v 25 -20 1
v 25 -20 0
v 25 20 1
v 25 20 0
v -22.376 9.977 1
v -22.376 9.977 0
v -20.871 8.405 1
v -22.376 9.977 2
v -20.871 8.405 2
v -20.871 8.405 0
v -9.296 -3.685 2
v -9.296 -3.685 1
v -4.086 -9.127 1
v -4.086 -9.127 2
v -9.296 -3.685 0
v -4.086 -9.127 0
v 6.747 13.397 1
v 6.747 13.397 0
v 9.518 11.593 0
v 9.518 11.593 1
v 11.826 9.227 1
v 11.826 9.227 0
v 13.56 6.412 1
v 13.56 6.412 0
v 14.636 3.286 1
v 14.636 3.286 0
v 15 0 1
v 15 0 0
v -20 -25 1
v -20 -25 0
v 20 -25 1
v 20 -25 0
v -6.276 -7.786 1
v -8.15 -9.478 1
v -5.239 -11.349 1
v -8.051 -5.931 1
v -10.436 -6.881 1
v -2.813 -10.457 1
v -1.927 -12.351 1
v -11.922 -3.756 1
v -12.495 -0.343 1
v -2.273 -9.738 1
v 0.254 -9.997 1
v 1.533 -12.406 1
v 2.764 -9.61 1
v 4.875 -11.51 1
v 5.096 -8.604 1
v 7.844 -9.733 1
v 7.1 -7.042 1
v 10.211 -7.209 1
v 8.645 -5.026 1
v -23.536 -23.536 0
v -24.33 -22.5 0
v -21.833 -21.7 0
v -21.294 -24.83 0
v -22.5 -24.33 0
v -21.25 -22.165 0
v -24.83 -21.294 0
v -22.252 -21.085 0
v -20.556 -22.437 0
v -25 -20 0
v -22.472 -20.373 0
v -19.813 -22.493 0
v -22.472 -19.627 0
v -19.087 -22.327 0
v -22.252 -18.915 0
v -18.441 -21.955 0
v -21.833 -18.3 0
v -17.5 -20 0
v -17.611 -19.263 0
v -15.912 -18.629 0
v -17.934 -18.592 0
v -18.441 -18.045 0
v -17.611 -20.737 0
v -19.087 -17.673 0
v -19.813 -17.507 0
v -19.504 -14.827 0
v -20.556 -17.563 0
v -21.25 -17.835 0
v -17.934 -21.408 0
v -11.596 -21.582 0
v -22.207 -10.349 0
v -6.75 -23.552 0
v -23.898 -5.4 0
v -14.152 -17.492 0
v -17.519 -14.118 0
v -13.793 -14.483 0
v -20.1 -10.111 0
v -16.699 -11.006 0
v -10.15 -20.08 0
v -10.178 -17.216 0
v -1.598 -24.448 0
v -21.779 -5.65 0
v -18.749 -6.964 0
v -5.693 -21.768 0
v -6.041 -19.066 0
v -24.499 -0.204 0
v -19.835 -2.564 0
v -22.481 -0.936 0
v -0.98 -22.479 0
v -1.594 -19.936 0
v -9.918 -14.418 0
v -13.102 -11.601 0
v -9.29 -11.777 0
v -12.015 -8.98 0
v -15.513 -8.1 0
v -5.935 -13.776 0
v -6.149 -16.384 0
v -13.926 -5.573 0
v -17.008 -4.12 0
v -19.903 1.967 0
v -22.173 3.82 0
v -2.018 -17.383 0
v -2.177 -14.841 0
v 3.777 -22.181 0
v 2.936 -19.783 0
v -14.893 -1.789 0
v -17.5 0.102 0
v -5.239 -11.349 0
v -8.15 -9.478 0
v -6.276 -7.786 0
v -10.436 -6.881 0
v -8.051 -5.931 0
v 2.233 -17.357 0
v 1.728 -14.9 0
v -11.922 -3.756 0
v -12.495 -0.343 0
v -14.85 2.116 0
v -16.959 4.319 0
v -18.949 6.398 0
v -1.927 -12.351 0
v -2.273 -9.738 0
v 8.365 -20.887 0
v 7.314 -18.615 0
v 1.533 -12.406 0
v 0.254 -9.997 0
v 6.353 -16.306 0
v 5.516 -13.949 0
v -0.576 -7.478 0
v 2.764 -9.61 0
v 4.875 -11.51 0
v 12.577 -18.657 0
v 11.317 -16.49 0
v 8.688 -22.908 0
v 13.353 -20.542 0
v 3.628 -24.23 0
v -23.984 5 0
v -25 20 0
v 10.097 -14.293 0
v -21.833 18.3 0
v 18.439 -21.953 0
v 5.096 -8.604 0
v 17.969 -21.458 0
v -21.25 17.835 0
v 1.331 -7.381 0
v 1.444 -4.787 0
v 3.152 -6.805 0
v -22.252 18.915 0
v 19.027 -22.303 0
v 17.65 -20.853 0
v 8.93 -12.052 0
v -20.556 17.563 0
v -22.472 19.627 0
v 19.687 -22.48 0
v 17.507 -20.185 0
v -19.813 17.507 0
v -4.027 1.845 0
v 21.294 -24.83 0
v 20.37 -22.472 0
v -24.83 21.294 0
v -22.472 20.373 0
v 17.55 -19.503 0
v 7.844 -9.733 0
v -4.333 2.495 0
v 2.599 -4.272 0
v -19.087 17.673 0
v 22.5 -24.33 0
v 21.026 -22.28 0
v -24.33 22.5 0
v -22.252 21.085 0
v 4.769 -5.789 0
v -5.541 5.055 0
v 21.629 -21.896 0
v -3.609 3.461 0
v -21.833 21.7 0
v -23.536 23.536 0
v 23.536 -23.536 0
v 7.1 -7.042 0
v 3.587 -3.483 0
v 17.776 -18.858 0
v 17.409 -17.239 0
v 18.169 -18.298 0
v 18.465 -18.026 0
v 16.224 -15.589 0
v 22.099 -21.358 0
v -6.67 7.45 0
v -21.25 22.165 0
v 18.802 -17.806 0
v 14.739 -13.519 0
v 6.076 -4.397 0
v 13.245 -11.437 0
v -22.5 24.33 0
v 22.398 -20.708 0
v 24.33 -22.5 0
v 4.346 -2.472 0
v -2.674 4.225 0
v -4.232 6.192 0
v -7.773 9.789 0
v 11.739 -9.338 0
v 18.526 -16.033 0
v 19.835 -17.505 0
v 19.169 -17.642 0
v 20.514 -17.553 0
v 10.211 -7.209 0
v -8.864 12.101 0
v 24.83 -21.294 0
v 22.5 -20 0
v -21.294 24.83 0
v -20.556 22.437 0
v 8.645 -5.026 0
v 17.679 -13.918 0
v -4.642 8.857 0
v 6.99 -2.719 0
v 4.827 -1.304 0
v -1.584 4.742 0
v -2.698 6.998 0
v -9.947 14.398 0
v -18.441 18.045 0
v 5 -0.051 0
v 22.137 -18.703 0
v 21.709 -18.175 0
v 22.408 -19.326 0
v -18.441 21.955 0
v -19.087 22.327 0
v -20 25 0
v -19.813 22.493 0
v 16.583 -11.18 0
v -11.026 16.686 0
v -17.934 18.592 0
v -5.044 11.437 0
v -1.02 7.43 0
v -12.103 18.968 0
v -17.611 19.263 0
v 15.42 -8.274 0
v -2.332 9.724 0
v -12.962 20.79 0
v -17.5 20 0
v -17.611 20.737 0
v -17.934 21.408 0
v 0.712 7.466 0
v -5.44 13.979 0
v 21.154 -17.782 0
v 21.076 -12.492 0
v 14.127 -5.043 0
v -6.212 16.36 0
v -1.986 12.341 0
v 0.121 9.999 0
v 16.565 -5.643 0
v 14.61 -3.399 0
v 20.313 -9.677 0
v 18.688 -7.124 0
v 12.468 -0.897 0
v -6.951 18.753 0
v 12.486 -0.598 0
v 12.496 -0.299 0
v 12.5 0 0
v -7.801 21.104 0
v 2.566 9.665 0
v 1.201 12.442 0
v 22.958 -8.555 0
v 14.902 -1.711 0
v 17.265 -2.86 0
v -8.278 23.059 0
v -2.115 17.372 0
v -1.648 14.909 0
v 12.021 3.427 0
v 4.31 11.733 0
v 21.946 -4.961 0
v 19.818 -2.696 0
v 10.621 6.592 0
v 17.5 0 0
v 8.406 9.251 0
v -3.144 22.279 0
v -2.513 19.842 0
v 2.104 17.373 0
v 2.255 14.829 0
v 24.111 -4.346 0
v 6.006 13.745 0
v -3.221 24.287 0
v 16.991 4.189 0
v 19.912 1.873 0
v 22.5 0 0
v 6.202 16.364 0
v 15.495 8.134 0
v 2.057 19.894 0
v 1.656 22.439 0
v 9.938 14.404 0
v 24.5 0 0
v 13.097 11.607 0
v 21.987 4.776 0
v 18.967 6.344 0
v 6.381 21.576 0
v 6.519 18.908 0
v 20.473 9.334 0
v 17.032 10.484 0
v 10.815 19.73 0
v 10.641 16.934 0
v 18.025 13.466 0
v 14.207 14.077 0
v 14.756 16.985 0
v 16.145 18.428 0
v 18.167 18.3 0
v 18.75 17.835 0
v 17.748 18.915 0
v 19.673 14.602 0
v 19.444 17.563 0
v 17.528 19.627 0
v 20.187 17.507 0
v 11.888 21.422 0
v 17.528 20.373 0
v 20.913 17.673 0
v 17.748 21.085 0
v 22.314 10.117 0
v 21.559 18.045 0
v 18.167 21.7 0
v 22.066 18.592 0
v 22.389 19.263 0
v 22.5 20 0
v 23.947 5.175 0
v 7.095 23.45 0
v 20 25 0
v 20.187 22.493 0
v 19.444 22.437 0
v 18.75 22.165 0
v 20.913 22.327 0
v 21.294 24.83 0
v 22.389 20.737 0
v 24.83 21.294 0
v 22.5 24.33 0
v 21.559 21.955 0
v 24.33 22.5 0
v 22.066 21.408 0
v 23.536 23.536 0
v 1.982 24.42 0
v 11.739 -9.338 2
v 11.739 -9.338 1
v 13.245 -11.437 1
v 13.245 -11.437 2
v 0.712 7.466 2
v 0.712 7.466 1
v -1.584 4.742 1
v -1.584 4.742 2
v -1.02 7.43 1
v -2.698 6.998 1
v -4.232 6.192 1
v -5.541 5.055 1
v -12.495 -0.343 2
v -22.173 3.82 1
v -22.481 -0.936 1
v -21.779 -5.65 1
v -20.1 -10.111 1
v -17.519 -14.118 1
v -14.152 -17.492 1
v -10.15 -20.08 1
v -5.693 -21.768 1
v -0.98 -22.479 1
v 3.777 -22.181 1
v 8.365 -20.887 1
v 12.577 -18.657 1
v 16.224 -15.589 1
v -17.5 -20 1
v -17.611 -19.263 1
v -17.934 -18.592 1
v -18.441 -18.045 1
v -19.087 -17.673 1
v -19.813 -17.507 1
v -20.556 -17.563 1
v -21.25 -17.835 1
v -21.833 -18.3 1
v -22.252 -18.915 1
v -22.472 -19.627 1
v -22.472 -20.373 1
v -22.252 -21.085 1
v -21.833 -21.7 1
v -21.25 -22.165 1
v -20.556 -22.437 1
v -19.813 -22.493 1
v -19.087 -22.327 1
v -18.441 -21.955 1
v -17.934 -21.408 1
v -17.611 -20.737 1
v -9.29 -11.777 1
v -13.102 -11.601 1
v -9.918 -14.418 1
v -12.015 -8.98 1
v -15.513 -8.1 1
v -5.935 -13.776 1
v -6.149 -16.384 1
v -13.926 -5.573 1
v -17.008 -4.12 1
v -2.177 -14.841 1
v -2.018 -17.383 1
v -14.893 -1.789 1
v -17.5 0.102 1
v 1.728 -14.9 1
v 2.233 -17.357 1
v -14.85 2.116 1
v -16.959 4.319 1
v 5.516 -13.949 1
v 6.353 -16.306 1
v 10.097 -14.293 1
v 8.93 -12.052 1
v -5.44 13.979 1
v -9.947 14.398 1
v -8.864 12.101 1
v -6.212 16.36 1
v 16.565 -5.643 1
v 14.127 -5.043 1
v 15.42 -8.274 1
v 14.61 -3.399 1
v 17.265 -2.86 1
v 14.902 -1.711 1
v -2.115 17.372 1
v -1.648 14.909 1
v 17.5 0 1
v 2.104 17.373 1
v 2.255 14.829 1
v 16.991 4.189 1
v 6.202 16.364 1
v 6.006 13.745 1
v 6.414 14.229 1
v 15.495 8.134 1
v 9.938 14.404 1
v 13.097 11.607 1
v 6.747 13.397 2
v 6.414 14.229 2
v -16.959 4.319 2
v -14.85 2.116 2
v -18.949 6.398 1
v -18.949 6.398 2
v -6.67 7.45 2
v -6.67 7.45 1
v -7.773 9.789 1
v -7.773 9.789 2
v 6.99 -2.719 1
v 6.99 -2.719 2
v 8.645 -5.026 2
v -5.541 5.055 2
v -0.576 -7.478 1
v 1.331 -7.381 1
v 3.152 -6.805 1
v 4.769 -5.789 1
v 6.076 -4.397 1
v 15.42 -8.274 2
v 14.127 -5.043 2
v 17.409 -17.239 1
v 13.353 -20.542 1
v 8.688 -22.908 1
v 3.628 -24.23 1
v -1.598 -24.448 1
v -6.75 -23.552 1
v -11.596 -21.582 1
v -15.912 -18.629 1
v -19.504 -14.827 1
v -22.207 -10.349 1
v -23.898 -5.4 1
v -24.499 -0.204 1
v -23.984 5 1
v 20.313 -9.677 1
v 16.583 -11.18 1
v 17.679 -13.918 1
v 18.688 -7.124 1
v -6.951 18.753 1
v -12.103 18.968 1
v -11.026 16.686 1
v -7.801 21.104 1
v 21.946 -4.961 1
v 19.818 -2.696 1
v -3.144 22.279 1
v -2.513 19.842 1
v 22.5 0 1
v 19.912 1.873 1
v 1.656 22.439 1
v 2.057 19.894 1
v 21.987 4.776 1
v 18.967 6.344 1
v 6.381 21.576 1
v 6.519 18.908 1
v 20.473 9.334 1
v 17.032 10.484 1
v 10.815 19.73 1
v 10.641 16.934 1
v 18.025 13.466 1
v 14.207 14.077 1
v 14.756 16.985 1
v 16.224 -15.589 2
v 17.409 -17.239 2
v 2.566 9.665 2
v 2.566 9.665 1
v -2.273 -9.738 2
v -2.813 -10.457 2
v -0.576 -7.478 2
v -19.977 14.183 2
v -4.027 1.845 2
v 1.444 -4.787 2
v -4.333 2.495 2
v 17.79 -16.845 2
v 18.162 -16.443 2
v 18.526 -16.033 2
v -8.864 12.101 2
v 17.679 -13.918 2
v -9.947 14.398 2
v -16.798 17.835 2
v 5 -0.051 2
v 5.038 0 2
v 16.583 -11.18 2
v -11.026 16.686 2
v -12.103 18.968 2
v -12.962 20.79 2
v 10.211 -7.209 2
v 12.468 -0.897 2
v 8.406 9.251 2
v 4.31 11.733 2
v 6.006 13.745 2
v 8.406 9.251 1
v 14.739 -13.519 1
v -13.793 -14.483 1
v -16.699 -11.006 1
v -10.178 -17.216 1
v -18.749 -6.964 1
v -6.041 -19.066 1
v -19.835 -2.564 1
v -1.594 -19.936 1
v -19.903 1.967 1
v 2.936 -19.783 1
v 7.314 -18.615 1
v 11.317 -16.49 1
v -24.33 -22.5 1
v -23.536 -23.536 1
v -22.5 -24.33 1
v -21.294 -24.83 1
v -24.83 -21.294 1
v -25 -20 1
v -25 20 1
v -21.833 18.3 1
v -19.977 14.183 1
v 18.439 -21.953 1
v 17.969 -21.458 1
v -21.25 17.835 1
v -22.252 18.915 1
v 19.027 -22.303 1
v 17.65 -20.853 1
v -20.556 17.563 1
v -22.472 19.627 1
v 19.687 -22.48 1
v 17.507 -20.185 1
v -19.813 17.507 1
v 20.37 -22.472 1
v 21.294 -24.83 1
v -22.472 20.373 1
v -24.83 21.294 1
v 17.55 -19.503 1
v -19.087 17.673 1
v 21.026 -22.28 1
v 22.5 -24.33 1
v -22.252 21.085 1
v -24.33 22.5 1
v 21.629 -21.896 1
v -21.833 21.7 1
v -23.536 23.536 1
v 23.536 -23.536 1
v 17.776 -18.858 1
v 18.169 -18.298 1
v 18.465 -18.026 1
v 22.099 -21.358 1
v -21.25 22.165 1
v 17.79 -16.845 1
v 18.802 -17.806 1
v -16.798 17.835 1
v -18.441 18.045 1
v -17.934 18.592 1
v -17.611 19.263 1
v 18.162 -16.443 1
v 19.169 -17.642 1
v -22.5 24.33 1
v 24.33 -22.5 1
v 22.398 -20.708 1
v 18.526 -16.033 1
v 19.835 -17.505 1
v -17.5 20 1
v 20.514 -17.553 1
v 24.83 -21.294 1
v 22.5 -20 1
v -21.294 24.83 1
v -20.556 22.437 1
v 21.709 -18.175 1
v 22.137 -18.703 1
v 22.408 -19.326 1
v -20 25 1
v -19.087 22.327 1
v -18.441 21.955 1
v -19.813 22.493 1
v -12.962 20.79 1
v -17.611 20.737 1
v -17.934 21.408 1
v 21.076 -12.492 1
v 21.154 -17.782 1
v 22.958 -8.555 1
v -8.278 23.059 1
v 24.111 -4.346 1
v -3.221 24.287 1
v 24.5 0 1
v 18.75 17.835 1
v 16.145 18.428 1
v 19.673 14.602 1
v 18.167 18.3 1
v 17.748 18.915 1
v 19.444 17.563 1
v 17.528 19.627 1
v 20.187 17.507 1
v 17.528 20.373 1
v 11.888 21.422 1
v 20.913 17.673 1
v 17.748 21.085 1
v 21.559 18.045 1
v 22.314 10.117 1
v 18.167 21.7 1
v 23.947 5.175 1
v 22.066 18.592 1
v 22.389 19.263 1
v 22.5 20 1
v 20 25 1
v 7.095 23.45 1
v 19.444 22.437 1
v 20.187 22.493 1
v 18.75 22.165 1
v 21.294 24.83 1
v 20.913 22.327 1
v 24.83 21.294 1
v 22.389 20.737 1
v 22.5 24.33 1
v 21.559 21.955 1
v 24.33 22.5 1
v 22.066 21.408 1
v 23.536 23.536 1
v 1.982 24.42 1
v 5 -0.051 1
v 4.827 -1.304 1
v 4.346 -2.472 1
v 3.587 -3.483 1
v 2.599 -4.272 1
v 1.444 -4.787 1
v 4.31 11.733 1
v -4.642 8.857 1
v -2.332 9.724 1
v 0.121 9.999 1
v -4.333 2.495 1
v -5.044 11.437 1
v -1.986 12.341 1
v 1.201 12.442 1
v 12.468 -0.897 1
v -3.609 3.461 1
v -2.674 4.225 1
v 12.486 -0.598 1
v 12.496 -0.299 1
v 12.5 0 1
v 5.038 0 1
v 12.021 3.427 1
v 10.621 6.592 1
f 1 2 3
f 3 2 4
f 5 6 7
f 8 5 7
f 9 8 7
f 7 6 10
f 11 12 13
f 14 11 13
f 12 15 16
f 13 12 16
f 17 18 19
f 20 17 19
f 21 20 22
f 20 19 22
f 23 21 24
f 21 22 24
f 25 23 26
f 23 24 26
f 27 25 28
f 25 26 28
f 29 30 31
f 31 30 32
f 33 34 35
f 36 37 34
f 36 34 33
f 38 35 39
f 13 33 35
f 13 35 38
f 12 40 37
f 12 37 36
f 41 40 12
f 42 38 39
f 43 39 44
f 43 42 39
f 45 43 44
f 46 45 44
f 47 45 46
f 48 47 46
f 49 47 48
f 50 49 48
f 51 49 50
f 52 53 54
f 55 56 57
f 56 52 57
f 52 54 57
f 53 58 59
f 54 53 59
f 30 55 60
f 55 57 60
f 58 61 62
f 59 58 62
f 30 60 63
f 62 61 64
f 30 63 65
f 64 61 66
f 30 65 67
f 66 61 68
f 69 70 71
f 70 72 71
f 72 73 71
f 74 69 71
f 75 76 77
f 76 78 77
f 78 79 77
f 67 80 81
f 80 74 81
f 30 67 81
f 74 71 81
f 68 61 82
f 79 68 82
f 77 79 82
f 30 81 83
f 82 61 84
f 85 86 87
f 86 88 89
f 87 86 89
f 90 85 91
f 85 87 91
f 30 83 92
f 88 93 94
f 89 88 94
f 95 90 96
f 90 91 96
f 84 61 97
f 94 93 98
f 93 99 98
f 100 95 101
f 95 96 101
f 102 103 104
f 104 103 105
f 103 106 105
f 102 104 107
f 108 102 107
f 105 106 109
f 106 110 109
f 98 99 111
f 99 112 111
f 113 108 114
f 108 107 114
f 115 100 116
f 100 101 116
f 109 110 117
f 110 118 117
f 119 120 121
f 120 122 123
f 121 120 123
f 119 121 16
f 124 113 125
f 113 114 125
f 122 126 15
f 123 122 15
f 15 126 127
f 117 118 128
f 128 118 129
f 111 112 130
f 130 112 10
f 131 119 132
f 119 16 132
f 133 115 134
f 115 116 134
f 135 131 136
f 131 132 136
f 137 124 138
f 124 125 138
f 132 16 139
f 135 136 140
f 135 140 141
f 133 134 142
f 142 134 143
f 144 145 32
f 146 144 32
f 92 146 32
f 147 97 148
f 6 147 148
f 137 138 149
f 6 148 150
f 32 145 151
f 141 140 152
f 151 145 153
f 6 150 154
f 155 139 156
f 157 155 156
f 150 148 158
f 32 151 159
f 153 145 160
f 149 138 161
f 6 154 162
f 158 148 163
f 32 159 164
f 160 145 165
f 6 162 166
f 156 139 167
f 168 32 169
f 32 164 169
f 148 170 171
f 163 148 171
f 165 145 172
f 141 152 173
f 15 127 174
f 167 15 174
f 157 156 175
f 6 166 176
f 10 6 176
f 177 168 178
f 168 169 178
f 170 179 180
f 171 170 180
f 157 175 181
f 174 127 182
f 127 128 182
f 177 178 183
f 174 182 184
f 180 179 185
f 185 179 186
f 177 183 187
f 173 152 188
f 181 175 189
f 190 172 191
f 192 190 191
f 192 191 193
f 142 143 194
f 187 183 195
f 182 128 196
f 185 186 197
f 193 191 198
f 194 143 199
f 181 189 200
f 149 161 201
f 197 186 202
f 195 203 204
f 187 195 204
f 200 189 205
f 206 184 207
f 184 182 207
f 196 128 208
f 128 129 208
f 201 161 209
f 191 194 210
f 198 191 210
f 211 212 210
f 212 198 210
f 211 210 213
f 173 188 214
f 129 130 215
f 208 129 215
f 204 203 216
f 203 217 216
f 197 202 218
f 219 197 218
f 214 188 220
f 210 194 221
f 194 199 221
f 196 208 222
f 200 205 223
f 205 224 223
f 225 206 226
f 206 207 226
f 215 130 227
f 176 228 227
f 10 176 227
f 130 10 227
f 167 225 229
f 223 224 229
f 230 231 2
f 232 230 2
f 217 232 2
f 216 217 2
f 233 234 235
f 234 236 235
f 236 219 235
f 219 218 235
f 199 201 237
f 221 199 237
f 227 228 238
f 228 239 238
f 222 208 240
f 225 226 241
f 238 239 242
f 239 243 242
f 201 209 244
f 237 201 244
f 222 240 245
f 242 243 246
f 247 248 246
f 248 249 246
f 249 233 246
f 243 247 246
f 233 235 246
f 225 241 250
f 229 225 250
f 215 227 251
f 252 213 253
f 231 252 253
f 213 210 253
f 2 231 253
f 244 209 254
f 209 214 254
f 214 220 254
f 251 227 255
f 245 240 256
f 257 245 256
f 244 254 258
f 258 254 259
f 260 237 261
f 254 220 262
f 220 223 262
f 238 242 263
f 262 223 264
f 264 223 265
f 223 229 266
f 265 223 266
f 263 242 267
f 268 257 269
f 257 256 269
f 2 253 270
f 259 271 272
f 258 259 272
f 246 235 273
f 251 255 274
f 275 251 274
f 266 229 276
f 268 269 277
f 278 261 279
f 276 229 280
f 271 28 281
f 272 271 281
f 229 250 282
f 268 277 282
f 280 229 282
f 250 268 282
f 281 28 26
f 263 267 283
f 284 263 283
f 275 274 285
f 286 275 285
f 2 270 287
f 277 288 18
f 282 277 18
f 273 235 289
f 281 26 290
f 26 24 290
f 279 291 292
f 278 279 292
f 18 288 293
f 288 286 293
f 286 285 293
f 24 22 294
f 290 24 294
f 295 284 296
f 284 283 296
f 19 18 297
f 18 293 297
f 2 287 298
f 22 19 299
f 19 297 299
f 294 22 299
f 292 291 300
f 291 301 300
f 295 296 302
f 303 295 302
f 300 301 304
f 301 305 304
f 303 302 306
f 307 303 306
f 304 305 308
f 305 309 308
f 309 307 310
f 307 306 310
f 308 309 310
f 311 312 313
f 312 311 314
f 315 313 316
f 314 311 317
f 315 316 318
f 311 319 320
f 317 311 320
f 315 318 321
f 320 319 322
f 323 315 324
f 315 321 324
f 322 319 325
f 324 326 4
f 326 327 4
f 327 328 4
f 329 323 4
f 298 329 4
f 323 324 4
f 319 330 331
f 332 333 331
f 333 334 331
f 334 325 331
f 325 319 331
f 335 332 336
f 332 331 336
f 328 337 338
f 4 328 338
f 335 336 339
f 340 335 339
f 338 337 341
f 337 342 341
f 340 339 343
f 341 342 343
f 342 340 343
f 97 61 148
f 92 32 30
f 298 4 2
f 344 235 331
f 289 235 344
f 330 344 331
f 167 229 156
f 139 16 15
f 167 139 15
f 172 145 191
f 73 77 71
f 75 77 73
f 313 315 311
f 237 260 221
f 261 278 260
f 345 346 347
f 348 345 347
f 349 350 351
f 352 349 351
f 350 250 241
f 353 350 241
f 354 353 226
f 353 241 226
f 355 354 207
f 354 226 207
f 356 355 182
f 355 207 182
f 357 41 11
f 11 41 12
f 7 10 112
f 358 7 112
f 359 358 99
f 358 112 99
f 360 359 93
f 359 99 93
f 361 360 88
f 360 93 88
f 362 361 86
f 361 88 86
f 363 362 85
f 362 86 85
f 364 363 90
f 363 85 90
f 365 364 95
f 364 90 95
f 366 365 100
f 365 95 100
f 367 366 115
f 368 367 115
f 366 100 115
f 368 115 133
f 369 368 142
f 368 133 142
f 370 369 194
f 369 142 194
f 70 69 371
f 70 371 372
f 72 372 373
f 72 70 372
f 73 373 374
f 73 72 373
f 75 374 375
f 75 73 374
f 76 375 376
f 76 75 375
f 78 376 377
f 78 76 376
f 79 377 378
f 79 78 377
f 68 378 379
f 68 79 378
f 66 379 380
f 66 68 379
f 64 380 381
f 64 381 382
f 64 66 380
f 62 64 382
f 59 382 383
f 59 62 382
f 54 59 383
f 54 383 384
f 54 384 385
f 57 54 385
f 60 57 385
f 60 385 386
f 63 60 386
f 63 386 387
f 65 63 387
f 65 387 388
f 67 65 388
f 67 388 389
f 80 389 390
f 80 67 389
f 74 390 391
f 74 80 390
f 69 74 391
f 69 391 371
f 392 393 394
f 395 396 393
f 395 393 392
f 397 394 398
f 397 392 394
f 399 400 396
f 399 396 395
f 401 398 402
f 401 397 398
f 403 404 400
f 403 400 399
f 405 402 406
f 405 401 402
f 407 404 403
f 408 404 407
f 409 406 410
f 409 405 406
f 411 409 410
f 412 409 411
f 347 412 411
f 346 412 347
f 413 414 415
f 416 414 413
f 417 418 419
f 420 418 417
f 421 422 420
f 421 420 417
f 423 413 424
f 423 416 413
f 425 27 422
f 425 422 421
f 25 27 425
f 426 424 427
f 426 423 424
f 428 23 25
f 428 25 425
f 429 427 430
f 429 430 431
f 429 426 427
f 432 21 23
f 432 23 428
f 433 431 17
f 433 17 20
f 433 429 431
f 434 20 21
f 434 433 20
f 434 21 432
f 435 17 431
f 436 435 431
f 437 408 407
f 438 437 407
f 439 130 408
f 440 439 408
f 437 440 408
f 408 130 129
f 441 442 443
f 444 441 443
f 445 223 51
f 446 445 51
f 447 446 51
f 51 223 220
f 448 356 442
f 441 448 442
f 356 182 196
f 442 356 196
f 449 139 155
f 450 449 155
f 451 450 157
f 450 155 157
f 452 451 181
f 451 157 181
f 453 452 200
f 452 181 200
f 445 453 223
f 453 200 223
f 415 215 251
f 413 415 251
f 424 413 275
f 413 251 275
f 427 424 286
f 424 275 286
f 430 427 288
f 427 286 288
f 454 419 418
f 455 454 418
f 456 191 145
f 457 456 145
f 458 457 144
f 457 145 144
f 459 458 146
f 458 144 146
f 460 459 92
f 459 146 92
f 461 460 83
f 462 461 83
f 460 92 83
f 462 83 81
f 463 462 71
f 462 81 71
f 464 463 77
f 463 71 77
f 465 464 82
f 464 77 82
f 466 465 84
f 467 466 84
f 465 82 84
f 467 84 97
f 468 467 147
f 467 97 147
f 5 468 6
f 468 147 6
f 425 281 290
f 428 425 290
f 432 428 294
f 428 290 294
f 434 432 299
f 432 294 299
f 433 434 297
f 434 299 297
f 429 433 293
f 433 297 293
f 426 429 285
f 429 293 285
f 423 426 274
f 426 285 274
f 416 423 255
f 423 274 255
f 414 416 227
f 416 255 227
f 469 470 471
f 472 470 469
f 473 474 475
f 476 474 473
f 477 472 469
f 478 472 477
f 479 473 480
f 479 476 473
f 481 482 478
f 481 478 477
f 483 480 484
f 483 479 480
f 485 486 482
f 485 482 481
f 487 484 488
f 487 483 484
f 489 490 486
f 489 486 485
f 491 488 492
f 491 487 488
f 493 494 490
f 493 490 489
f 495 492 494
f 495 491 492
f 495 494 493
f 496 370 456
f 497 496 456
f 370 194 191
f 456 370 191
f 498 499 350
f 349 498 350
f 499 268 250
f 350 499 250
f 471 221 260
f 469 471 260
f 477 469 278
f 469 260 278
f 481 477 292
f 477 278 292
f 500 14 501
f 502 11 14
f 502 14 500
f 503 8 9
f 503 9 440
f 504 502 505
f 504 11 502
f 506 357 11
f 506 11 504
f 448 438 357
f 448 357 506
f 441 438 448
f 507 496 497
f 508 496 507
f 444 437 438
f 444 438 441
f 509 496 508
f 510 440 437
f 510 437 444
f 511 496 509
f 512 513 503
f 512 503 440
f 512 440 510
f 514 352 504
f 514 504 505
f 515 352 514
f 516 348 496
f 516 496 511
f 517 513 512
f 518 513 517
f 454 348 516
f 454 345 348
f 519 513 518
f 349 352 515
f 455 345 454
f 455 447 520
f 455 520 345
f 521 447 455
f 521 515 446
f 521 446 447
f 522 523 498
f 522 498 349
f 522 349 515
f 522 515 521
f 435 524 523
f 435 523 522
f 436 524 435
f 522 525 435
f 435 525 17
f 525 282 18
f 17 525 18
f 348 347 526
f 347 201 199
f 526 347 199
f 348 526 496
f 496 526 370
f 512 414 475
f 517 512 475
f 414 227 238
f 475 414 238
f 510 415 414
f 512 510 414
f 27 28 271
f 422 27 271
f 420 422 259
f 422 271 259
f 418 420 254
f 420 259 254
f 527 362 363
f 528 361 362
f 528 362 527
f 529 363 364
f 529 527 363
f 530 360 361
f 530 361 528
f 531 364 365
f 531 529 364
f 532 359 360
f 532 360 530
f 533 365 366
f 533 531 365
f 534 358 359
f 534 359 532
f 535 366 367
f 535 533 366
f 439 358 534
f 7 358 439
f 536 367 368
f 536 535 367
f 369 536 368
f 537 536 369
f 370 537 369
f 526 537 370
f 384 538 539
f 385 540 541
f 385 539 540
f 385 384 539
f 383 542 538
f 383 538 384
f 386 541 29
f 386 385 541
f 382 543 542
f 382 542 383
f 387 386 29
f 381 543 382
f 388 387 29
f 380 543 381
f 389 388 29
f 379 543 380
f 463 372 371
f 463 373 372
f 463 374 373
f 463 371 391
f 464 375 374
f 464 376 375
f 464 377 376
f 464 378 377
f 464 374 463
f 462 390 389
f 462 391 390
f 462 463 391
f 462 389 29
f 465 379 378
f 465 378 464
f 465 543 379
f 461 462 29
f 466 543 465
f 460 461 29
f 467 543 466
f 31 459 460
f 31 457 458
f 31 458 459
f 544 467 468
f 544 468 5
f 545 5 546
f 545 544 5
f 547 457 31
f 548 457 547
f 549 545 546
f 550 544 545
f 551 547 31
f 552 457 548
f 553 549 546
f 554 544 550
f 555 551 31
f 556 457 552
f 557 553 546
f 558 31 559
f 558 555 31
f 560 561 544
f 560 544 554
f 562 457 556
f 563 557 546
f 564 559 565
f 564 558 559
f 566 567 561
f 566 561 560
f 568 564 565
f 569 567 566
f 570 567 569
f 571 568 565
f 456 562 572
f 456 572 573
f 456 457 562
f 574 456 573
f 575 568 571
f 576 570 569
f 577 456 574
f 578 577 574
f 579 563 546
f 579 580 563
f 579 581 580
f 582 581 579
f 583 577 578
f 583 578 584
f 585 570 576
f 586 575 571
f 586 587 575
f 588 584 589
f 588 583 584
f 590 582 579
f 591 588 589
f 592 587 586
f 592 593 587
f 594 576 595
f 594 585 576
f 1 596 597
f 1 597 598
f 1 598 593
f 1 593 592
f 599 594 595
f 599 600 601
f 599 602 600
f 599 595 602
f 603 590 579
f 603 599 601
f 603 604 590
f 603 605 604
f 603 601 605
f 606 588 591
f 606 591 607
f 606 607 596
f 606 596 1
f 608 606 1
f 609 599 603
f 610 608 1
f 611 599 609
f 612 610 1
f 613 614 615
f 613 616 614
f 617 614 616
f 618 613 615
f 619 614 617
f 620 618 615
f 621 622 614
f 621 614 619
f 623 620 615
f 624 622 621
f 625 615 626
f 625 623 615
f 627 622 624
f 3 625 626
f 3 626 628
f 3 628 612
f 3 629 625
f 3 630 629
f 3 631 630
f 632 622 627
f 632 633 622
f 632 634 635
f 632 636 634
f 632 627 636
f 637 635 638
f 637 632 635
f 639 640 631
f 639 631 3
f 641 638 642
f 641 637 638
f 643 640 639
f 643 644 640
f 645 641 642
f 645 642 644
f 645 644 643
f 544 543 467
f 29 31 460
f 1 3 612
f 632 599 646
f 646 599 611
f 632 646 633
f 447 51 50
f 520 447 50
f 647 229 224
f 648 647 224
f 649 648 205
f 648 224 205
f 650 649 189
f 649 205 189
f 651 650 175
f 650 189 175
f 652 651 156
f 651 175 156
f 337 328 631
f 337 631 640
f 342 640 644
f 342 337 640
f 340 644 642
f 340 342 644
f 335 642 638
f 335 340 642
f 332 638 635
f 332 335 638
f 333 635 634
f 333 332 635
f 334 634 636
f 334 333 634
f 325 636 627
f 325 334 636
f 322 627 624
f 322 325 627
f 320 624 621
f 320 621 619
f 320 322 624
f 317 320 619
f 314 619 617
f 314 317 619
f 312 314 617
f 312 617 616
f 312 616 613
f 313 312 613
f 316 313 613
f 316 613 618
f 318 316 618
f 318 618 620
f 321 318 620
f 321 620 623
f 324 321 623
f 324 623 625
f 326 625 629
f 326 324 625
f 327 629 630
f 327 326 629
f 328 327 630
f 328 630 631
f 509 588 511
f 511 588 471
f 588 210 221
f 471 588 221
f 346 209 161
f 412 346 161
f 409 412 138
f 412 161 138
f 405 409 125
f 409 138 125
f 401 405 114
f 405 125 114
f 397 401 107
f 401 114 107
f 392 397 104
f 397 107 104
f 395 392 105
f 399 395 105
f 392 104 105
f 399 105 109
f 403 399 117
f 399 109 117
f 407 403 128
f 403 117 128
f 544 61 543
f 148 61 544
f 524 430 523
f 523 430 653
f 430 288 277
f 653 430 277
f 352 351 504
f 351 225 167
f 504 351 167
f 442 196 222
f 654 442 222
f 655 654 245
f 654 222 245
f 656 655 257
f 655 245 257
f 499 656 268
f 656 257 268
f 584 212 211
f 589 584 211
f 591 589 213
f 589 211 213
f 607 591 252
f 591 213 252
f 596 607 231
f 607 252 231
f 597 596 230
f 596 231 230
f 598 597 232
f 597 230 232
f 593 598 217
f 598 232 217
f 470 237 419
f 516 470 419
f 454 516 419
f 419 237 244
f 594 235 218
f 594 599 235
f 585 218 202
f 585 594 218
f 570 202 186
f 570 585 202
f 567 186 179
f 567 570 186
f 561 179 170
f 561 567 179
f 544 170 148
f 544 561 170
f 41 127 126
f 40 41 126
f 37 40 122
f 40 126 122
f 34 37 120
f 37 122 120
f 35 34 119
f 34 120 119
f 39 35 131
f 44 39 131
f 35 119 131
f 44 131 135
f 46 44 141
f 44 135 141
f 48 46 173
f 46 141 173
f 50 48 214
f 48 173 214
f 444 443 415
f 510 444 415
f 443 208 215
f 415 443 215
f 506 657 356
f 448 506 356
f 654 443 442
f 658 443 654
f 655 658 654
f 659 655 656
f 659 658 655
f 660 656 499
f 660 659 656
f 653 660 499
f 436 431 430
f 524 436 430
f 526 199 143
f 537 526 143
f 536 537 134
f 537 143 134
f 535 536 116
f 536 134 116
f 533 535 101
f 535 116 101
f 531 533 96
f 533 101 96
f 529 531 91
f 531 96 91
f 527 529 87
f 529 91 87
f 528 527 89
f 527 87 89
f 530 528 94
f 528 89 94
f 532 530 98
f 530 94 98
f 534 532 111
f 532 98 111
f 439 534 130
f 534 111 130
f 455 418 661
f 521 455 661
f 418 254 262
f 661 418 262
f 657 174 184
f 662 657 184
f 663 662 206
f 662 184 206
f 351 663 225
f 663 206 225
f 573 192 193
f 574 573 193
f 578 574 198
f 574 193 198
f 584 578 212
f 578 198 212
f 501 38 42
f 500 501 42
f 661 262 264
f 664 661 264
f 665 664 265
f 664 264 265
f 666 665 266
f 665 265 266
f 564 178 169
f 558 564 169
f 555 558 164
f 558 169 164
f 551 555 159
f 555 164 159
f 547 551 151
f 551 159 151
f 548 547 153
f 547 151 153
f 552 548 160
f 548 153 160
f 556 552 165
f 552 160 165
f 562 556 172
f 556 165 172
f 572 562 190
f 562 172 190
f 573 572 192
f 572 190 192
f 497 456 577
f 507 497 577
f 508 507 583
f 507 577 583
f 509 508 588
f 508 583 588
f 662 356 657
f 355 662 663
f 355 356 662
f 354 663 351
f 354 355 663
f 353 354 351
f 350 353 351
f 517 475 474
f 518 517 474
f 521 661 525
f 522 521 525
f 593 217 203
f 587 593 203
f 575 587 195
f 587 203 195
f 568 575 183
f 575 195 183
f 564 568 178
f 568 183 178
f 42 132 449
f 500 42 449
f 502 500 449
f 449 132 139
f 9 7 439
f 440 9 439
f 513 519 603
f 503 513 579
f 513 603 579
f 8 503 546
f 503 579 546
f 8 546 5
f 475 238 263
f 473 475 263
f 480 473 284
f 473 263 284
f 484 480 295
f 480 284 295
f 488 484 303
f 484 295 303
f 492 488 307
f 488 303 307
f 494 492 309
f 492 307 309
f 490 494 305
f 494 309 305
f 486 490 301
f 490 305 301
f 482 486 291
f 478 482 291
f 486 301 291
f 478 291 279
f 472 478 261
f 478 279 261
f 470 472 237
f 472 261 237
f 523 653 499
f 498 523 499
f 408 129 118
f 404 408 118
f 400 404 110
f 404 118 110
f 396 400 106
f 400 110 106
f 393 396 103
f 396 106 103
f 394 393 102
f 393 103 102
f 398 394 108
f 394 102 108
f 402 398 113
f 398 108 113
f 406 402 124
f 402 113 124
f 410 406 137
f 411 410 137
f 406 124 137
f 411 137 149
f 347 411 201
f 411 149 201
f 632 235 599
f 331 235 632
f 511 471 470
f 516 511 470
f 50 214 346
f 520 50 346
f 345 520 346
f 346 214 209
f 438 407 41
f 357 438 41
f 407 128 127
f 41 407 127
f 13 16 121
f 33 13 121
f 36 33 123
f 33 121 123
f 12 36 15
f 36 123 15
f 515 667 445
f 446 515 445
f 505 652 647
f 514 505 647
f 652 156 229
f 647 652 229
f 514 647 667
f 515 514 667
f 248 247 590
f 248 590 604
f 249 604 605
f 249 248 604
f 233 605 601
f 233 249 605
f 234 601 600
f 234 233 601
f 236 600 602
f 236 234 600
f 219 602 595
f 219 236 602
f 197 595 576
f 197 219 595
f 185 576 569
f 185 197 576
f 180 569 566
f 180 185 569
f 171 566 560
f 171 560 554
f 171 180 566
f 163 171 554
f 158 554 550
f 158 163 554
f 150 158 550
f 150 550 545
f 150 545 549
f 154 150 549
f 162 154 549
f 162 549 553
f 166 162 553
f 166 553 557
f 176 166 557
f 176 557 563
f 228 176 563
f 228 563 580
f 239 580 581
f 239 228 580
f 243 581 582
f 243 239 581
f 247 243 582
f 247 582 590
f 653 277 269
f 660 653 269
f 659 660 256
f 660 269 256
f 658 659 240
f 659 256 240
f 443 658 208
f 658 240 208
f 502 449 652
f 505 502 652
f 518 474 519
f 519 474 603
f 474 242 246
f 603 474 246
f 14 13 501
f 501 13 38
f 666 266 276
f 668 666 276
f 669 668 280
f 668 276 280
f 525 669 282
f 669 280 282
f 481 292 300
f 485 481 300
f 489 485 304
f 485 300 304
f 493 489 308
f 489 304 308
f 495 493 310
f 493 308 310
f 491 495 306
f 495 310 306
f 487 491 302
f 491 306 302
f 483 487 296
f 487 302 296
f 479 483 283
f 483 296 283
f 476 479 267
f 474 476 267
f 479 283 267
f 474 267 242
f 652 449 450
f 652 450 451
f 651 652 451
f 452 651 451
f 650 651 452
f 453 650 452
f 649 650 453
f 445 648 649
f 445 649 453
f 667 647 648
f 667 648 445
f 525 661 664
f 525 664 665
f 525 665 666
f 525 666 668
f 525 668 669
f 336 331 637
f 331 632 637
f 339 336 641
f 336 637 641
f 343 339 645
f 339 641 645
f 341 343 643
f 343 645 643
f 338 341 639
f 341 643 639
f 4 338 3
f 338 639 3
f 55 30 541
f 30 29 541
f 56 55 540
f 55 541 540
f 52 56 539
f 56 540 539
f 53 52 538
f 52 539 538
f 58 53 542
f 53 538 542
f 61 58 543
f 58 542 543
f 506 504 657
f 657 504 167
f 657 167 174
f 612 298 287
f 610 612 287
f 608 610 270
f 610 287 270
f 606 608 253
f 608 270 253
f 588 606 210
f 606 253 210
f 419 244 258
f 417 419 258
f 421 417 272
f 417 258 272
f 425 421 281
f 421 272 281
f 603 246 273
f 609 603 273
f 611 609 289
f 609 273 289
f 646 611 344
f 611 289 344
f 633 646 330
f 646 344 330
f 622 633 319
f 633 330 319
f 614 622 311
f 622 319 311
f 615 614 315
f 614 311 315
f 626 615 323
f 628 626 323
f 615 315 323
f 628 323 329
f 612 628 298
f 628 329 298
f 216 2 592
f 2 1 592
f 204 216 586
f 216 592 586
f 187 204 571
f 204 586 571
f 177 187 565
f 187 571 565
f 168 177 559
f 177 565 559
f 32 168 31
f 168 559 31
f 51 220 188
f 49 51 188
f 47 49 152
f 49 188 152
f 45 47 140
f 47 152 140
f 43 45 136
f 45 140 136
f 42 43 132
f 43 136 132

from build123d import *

# Parameters (mm, degrees)
F0_W     = 50
F0_H     = 50
F0_R     = 3.5
F0_R_2   = 2.5
F1_DEPTH = 1
F2_DEPTH = 2
F3_R     = 5


with BuildPart() as f1:
    # F0 (on Top) → F1 (new body)
    with BuildSketch(Plane.XY):
        Rectangle(F0_W, F0_H)
        with Locations((-20, -20)):
            Circle(F0_R, mode=Mode.SUBTRACT)
        with Locations((-20, 20)):
            Circle(F0_R, mode=Mode.SUBTRACT)
        with BuildLine():
            ThreePointArc((23.5, -20), (18.6270110009, -23.2194566635), (17.5771993095, -17.4741265245))
            Line((17.5771993095, -17.4741265245), (17.4086205584, -17.2391974945))
            ThreePointArc((17.4086205584, -17.2391974945), (-13.8331182922, -20.2211482936), (-22.3763686864, 9.9773806388))
            ThreePointArc((-22.3763686864, 9.9773806388), (-18.4779593257, 16.0877288378), (-12.9623567896, 20.7900771153))
            ThreePointArc((-12.9623567896, 20.7900771153), (11.8884872598, 21.422275105), (24.5, 0))
            ThreePointArc((24.5, 0), (22.9578459258, -8.5549582375), (18.5255256779, -16.0329316832))
            Line((18.5255256779, -16.0329316832), (18.7976972629, -16.7129849212))
            ThreePointArc((18.7976972629, -16.7129849212), (22.0052356994, -17.1313714444), (23.5, -20))
        make_face(mode=Mode.SUBTRACT)
        with Locations((20, 20)):
            Circle(F0_R, mode=Mode.SUBTRACT)
        with BuildLine():
            ThreePointArc((-12.9623567896, 20.7900771153), (-18.4779593257, 16.0877288378), (-22.3763686864, 9.9773806388))
            Line((-22.3763686864, 9.9773806388), (-20.8711196987, 8.4051390543))
            ThreePointArc((-20.8711196987, 8.4051390543), (-17.3121734711, 14.3714525956), (-12.1027830938, 18.9676735892))
            Line((-12.1027830938, 18.9676735892), (-12.9623567896, 20.7900771153))
        make_face()
        with BuildLine():
            ThreePointArc((-12.1027830938, 18.9676735892), (-17.3121734711, 14.3714525956), (-20.8711196987, 8.4051390543))
            Line((-20.8711196987, 8.4051390543), (-18.9491508236, 6.397631051))
            ThreePointArc((-18.9491508236, 6.397631051), (-15.8460260332, 12.2026004997), (-11.0264971881, 16.6858131285))
            Line((-11.0264971881, 16.6858131285), (-12.1027830938, 18.9676735892))
        make_face()
        with BuildLine():
            ThreePointArc((-11.0264971881, 16.6858131285), (-15.8460260332, 12.2026004997), (-18.9491508236, 6.397631051))
            Line((-18.9491508236, 6.397631051), (-16.9587523233, 4.3186478944))
            ThreePointArc((-16.9587523233, 4.3186478944), (-14.3660250029, 9.9933640791), (-9.9473635328, 14.3979150833))
            Line((-9.9473635328, 14.3979150833), (-11.0264971881, 16.6858131285))
        make_face()
        with BuildLine():
            ThreePointArc((-9.9473635328, 14.3979150833), (-14.3660250029, 9.9933640791), (-16.9587523233, 4.3186478944))
            Line((-16.9587523233, 4.3186478944), (-14.849995899, 2.1160391771))
            ThreePointArc((-14.849995899, 2.1160391771), (-12.8651308932, 7.7128728176), (-8.8639147293, 12.1008683851))
            Line((-8.8639147293, 12.1008683851), (-9.9473635328, 14.3979150833))
        make_face()
        with BuildLine():
            ThreePointArc((-8.8639147293, 12.1008683851), (-12.8651308932, 7.7128728176), (-14.849995899, 2.1160391771))
            Line((-14.849995899, 2.1160391771), (-12.4952800896, -0.3434755913))
            ThreePointArc((-12.4952800896, -0.3434755913), (-11.3301301239, 5.2799764559), (-7.7734498383, 9.7889467059))
            Line((-7.7734498383, 9.7889467059), (-8.8639147293, 12.1008683851))
        make_face()
        with BuildLine():
            ThreePointArc((-7.7734498383, 9.7889467059), (-11.3301301239, 5.2799764559), (-12.4952800896, -0.3434755913))
            Line((-12.4952800896, -0.3434755913), (-9.2963769315, -3.6847491023))
            ThreePointArc((-9.2963769315, -3.6847491023), (-9.7329978262, 2.2953765084), (-6.670358772, 7.4502559589))
            Line((-6.670358772, 7.4502559589), (-7.7734498383, 9.7889467059))
        make_face()
        with BuildLine():
            ThreePointArc((-6.670358772, 7.4502559589), (-9.7329978262, 2.2953765084), (-9.2963769315, -3.6847491023))
            Line((-9.2963769315, -3.6847491023), (-4.0858046945, -9.1272230168))
            ThreePointArc((-4.0858046945, -9.1272230168), (-3.1940488203, -9.476183416), (-2.2730034578, -9.7382470333))
            Line((-2.2730034578, -9.7382470333), (-0.575954004, -7.4778524314))
            ThreePointArc((-0.575954004, -7.4778524314), (-6.9728435303, -2.7621464664), (-5.5405526463, 5.0549259514))
            Line((-5.5405526463, 5.0549259514), (-6.670358772, 7.4502559589))
        make_face()
        with BuildLine():
            ThreePointArc((-5.5405526463, 5.0549259514), (-6.9728435303, -2.7621464664), (-0.575954004, -7.4778524314))
            Line((-0.575954004, -7.4778524314), (1.4444038201, -4.7868254203))
            ThreePointArc((1.4444038201, -4.7868254203), (-3.9168845093, -3.1077348247), (-4.3330657581, 2.4949030315))
            Line((-4.3330657581, 2.4949030315), (-5.5405526463, 5.0549259514))
        make_face()
        with BuildLine():
            Line((1.4444038201, -4.7868254203), (4.9997370367, -0.0512792683))
            ThreePointArc((4.9997370367, -0.0512792683), (4.9999342588, -0.0256399712), (5, 0))
            ThreePointArc((5, 0), (2.9222816207, 4.0571258458), (-1.5841080516, 4.7424257169))
            Line((-1.5841080516, 4.7424257169), (-4.0267086588, 1.8453877419))
            Line((-4.0267086588, 1.8453877419), (-4.3330657581, 2.4949030315))
            ThreePointArc((-4.3330657581, 2.4949030315), (-3.9168845093, -3.1077348247), (1.4444038201, -4.7868254203))
        make_face()
        with BuildLine():
            Line((5.0382362679, 0), (6.9896180853, -2.7194188756))
            ThreePointArc((6.9896180853, -2.7194188756), (7.3713002801, -1.3834493775), (7.5, 0))
            ThreePointArc((7.5, 0), (5.5494325298, 5.0451757747), (0.7123203741, 7.4660966833))
            Line((0.7123203741, 7.4660966833), (-1.5841080516, 4.7424257169))
            ThreePointArc((-1.5841080516, 4.7424257169), (2.9222816207, 4.0571258458), (5, 0))
            ThreePointArc((5, 0), (4.9999342588, -0.0256399712), (4.9997370367, -0.0512792683))
            Line((4.9997370367, -0.0512792683), (5.0382362679, 0))
        make_face()
        with BuildLine():
            Line((6.9896180853, -2.7194188756), (8.644997375, -5.0263326976))
            ThreePointArc((8.644997375, -5.0263326976), (9.6553087405, -2.6028855382), (10, 0))
            ThreePointArc((10, 0), (7.9266528427, 6.0965707337), (2.5663650578, 9.6650799474))
            Line((2.5663650578, 9.6650799474), (0.7123203741, 7.4660966833))
            ThreePointArc((0.7123203741, 7.4660966833), (5.5494325298, 5.0451757747), (7.5, 0))
            ThreePointArc((7.5, 0), (7.3713002801, -1.3834493775), (6.9896180853, -2.7194188756))
        make_face()
        with BuildLine():
            Line((8.644997375, -5.0263326976), (10.2114993781, -7.2093883548))
            ThreePointArc((10.2114993781, -7.2093883548), (11.7706927711, -4.2072308814), (12.4677792663, -0.8969281838))
            Line((12.4677792663, -0.8969281838), (8.4062966321, 9.2511716519))
            ThreePointArc((8.4062966321, 9.2511716519), (6.4782537194, 10.6902866541), (4.3102189136, 11.7333717625))
            Line((4.3102189136, 11.7333717625), (2.5663650578, 9.6650799474))
            ThreePointArc((2.5663650578, 9.6650799474), (7.9266528427, 6.0965707337), (10, 0))
            ThreePointArc((10, 0), (9.6553087405, -2.6028855382), (8.644997375, -5.0263326976))
        make_face()
        with BuildLine():
            Line((10.2114993781, -7.2093883548), (11.7389174346, -9.3379771612))
            ThreePointArc((11.7389174346, -9.3379771612), (13.1100600813, -7.2887807392), (14.1269841628, -5.0426499446))
            Line((14.1269841628, -5.0426499446), (12.4677792663, -0.8969281838))
            ThreePointArc((12.4677792663, -0.8969281838), (11.7706927711, -4.2072308814), (10.2114993781, -7.2093883548))
        make_face()
        with BuildLine():
            Line((11.7389174346, -9.3379771612), (13.2453224947, -11.4372825448))
            ThreePointArc((13.2453224947, -11.4372825448), (14.4198202083, -9.9155829461), (15.4203376918, -8.2742483328))
            Line((15.4203376918, -8.2742483328), (14.1269841628, -5.0426499446))
            ThreePointArc((14.1269841628, -5.0426499446), (13.1100600813, -7.2887807392), (11.7389174346, -9.3379771612))
        make_face()
        with BuildLine():
            Line((13.2453224947, -11.4372825448), (14.7390379273, -13.5189038379))
            ThreePointArc((14.7390379273, -13.5189038379), (15.704772219, -12.3838656949), (16.583307557, -11.1800675522))
            Line((16.583307557, -11.1800675522), (15.4203376918, -8.2742483328))
            ThreePointArc((15.4203376918, -8.2742483328), (14.4198202083, -9.9155829461), (13.2453224947, -11.4372825448))
        make_face()
        with BuildLine():
            Line((14.7390379273, -13.5189038379), (16.224472995, -15.5889857283))
            ThreePointArc((16.224472995, -15.5889857283), (16.9723110034, -14.7712781845), (17.6789827405, -13.9177429657))
            Line((17.6789827405, -13.9177429657), (16.583307557, -11.1800675522))
            ThreePointArc((16.583307557, -11.1800675522), (15.704772219, -12.3838656949), (14.7390379273, -13.5189038379))
        make_face()
        with BuildLine():
            Line((16.224472995, -15.5889857283), (17.4086205584, -17.2391974945))
            ThreePointArc((17.4086205584, -17.2391974945), (17.9771934888, -16.6454352381), (18.5255256779, -16.0329316832))
            Line((18.5255256779, -16.0329316832), (17.6789827405, -13.9177429657))
            ThreePointArc((17.6789827405, -13.9177429657), (16.9723110034, -14.7712781845), (16.224472995, -15.5889857283))
        make_face()
        with BuildLine():
            Line((17.4086205584, -17.2391974945), (17.5771993095, -17.4741265245))
            ThreePointArc((17.5771993095, -17.4741265245), (18.1479260678, -17.0301814618), (18.7976972629, -16.7129849212))
            Line((18.7976972629, -16.7129849212), (18.5255256779, -16.0329316832))
            ThreePointArc((18.5255256779, -16.0329316832), (17.9771934888, -16.6454352381), (17.4086205584, -17.2391974945))
        make_face()
        with BuildLine():
            ThreePointArc((22.5, -20), (22.0993136417, -21.3575279863), (21.0256942131, -22.2799016166))
            ThreePointArc((21.0256942131, -22.2799016166), (17.9688292761, -21.4575134615), (18.1685795283, -18.298265868))
            Line((18.1685795283, -18.298265868), (17.5771993095, -17.4741265245))
            ThreePointArc((17.5771993095, -17.4741265245), (18.6270110009, -23.2194566635), (23.5, -20))
            ThreePointArc((23.5, -20), (22.0052356994, -17.1313714444), (18.7976972629, -16.7129849212))
            Line((18.7976972629, -16.7129849212), (19.1694996754, -17.6419776908))
            ThreePointArc((19.1694996754, -17.6419776908), (21.4446018809, -17.9596261603), (22.5, -20))
        make_face()
        with BuildLine():
            Line((17.5771993095, -17.4741265245), (18.1685795283, -18.298265868))
            ThreePointArc((18.1685795283, -18.298265868), (18.6291848687, -17.909338412), (19.1694996754, -17.6419776908))
            Line((19.1694996754, -17.6419776908), (18.7976972629, -16.7129849212))
            ThreePointArc((18.7976972629, -16.7129849212), (18.1479260678, -17.0301814618), (17.5771993095, -17.4741265245))
        make_face()
        with Locations((-20, -20)):
            Circle(F0_R)
        with Locations((-20, -20)):
            Circle(F0_R_2, mode=Mode.SUBTRACT)
        with Locations((20, 20)):
            Circle(F0_R)
        with Locations((20, 20)):
            Circle(F0_R_2, mode=Mode.SUBTRACT)
        with Locations((-20, 20)):
            Circle(F0_R)
        with Locations((-20, 20)):
            Circle(F0_R_2, mode=Mode.SUBTRACT)
        with BuildLine():
            ThreePointArc((4.3102189136, 11.7333717625), (6.4782537194, 10.6902866541), (8.4062966321, 9.2511716519))
            Line((8.4062966321, 9.2511716519), (6.7470917355, 13.3968934127))
            ThreePointArc((6.7470917355, 13.3968934127), (6.3790622823, 13.5759922068), (6.0062833463, 13.744983098))
            Line((6.0062833463, 13.744983098), (4.3102189136, 11.7333717625))
        make_face()
        with BuildLine():
            ThreePointArc((6.0062833463, 13.744983098), (6.3790622823, 13.5759922068), (6.7470917355, 13.3968934127))
            Line((6.7470917355, 13.3968934127), (6.4141652547, 14.2287500203))
            Line((6.4141652547, 14.2287500203), (6.0062833463, 13.744983098))
        make_face()
        with BuildLine():
            Line((-2.8126535472, -10.4570370167), (-2.2730034578, -9.7382470333))
            ThreePointArc((-2.2730034578, -9.7382470333), (-3.1940488203, -9.476183416), (-4.0858046945, -9.1272230168))
            Line((-4.0858046945, -9.1272230168), (-2.8126535472, -10.4570370167))
        make_face()
        with BuildLine():
            ThreePointArc((-20.8711196987, 8.4051390543), (-12.2199565227, -18.8923969518), (16.224472995, -15.5889857283))
            Line((16.224472995, -15.5889857283), (14.7390379273, -13.5189038379))
            ThreePointArc((14.7390379273, -13.5189038379), (-10.1783276202, -17.2163192017), (-18.9491508236, 6.397631051))
            Line((-18.9491508236, 6.397631051), (-20.8711196987, 8.4051390543))
        make_face()
        with BuildLine():
            ThreePointArc((-16.9587523233, 4.3186478944), (-8.0938078971, -15.5158072212), (13.2453224947, -11.4372825448))
            Line((13.2453224947, -11.4372825448), (11.7389174346, -9.3379771612))
            ThreePointArc((11.7389174346, -9.3379771612), (-5.9345029171, -13.7761270003), (-14.849995899, 2.1160391771))
            Line((-14.849995899, 2.1160391771), (-16.9587523233, 4.3186478944))
        make_face()
        with BuildLine():
            ThreePointArc((-12.4952800896, -0.3434755913), (-3.6178865521, -11.964986289), (10.2114993781, -7.2093883548))
            Line((10.2114993781, -7.2093883548), (8.644997375, -5.0263326976))
            ThreePointArc((8.644997375, -5.0263326976), (3.9624627187, -9.1814426537), (-2.2730034578, -9.7382470333))
            Line((-2.2730034578, -9.7382470333), (-2.8126535472, -10.4570370167))
            Line((-2.8126535472, -10.4570370167), (-4.0858046945, -9.1272230168))
            ThreePointArc((-4.0858046945, -9.1272230168), (-7.2232836609, -6.915502379), (-9.2963769315, -3.6847491023))
            Line((-9.2963769315, -3.6847491023), (-12.4952800896, -0.3434755913))
        make_face()
        with BuildLine():
            ThreePointArc((-0.575954004, -7.4778524314), (3.993049488, -6.3486656698), (6.9896180853, -2.7194188756))
            Line((6.9896180853, -2.7194188756), (5.0382362679, 0))
            Line((5.0382362679, 0), (4.9997370367, -0.0512792683))
            ThreePointArc((4.9997370367, -0.0512792683), (3.9985106209, -3.0019848126), (1.4444038201, -4.7868254203))
            Line((1.4444038201, -4.7868254203), (-0.575954004, -7.4778524314))
        make_face()
        with BuildLine():
            Line((16.583307557, -11.1800675522), (17.6789827405, -13.9177429657))
            ThreePointArc((17.6789827405, -13.9177429657), (21.2606104294, -7.3645396441), (22.5, 0))
            ThreePointArc((22.5, 0), (10.8152064333, 19.7302131211), (-12.1027830938, 18.9676735892))
            Line((-12.1027830938, 18.9676735892), (-11.0264971881, 16.6858131285))
            ThreePointArc((-11.0264971881, 16.6858131285), (9.4728574421, 17.6143399502), (20, 0))
            ThreePointArc((20, 0), (19.1267633323, -5.8452480213), (16.583307557, -11.1800675522))
        make_face()
        with BuildLine():
            Line((14.1269841628, -5.0426499446), (15.4203376918, -8.2742483328))
            ThreePointArc((15.4203376918, -8.2742483328), (16.9721228726, -4.2657994792), (17.5, 0))
            ThreePointArc((17.5, 0), (8.1293031121, 15.497239461), (-9.9473635328, 14.3979150833))
            Line((-9.9473635328, 14.3979150833), (-8.8639147293, 12.1008683851))
            ThreePointArc((-8.8639147293, 12.1008683851), (-1.6484212379, 14.9091484473), (6.0062833463, 13.744983098))
            Line((6.0062833463, 13.744983098), (6.4141652547, 14.2287500203))
            Line((6.4141652547, 14.2287500203), (6.7470917355, 13.3968934127))
            ThreePointArc((6.7470917355, 13.3968934127), (12.77118585, 7.8674526998), (15, 0))
            ThreePointArc((15, 0), (14.7801346821, -2.5588315261), (14.1269841628, -5.0426499446))
        make_face()
        with BuildLine():
            Line((8.4062966321, 9.2511716519), (12.4677792663, -0.8969281838))
            ThreePointArc((12.4677792663, -0.8969281838), (12.4919422195, -0.4487533684), (12.5, 0))
            ThreePointArc((12.5, 0), (11.4308509723, 5.0582255831), (8.4062966321, 9.2511716519))
        make_face()
        with BuildLine():
            ThreePointArc((4.3102189136, 11.7333717625), (-1.9858724304, 12.3412442926), (-7.7734498383, 9.7889467059))
            Line((-7.7734498383, 9.7889467059), (-6.670358772, 7.4502559589))
            ThreePointArc((-6.670358772, 7.4502559589), (-2.3317487915, 9.7243481824), (2.5663650578, 9.6650799474))
            Line((2.5663650578, 9.6650799474), (4.3102189136, 11.7333717625))
        make_face()
        with BuildLine():
            ThreePointArc((0.7123203741, 7.4660966833), (-2.698405602, 6.9977572984), (-5.5405526463, 5.0549259514))
            Line((-5.5405526463, 5.0549259514), (-4.3330657581, 2.4949030315))
            ThreePointArc((-4.3330657581, 2.4949030315), (-3.1648184828, 3.8709073834), (-1.5841080516, 4.7424257169))
            Line((-1.5841080516, 4.7424257169), (0.7123203741, 7.4660966833))
        make_face()
    extrude(amount=F1_DEPTH)

    # F0 (on Top) → F2 (join)
    with BuildSketch(Plane.XY):
        with BuildLine():
            Line((16.224472995, -15.5889857283), (17.4086205584, -17.2391974945))
            ThreePointArc((17.4086205584, -17.2391974945), (17.9771934888, -16.6454352381), (18.5255256779, -16.0329316832))
            Line((18.5255256779, -16.0329316832), (17.6789827405, -13.9177429657))
            ThreePointArc((17.6789827405, -13.9177429657), (16.9723110034, -14.7712781845), (16.224472995, -15.5889857283))
        make_face()
        with BuildLine():
            Line((14.7390379273, -13.5189038379), (16.224472995, -15.5889857283))
            ThreePointArc((16.224472995, -15.5889857283), (16.9723110034, -14.7712781845), (17.6789827405, -13.9177429657))
            Line((17.6789827405, -13.9177429657), (16.583307557, -11.1800675522))
            ThreePointArc((16.583307557, -11.1800675522), (15.704772219, -12.3838656949), (14.7390379273, -13.5189038379))
        make_face()
        with BuildLine():
            Line((13.2453224947, -11.4372825448), (14.7390379273, -13.5189038379))
            ThreePointArc((14.7390379273, -13.5189038379), (15.704772219, -12.3838656949), (16.583307557, -11.1800675522))
            Line((16.583307557, -11.1800675522), (15.4203376918, -8.2742483328))
            ThreePointArc((15.4203376918, -8.2742483328), (14.4198202083, -9.9155829461), (13.2453224947, -11.4372825448))
        make_face()
        with BuildLine():
            Line((11.7389174346, -9.3379771612), (13.2453224947, -11.4372825448))
            ThreePointArc((13.2453224947, -11.4372825448), (14.4198202083, -9.9155829461), (15.4203376918, -8.2742483328))
            Line((15.4203376918, -8.2742483328), (14.1269841628, -5.0426499446))
            ThreePointArc((14.1269841628, -5.0426499446), (13.1100600813, -7.2887807392), (11.7389174346, -9.3379771612))
        make_face()
        with BuildLine():
            Line((10.2114993781, -7.2093883548), (11.7389174346, -9.3379771612))
            ThreePointArc((11.7389174346, -9.3379771612), (13.1100600813, -7.2887807392), (14.1269841628, -5.0426499446))
            Line((14.1269841628, -5.0426499446), (12.4677792663, -0.8969281838))
            ThreePointArc((12.4677792663, -0.8969281838), (11.7706927711, -4.2072308814), (10.2114993781, -7.2093883548))
        make_face()
        with BuildLine():
            Line((8.644997375, -5.0263326976), (10.2114993781, -7.2093883548))
            ThreePointArc((10.2114993781, -7.2093883548), (11.7706927711, -4.2072308814), (12.4677792663, -0.8969281838))
            Line((12.4677792663, -0.8969281838), (8.4062966321, 9.2511716519))
            ThreePointArc((8.4062966321, 9.2511716519), (6.4782537194, 10.6902866541), (4.3102189136, 11.7333717625))
            Line((4.3102189136, 11.7333717625), (2.5663650578, 9.6650799474))
            ThreePointArc((2.5663650578, 9.6650799474), (7.9266528427, 6.0965707337), (10, 0))
            ThreePointArc((10, 0), (9.6553087405, -2.6028855382), (8.644997375, -5.0263326976))
        make_face()
        with BuildLine():
            Line((6.9896180853, -2.7194188756), (8.644997375, -5.0263326976))
            ThreePointArc((8.644997375, -5.0263326976), (9.6553087405, -2.6028855382), (10, 0))
            ThreePointArc((10, 0), (7.9266528427, 6.0965707337), (2.5663650578, 9.6650799474))
            Line((2.5663650578, 9.6650799474), (0.7123203741, 7.4660966833))
            ThreePointArc((0.7123203741, 7.4660966833), (5.5494325298, 5.0451757747), (7.5, 0))
            ThreePointArc((7.5, 0), (7.3713002801, -1.3834493775), (6.9896180853, -2.7194188756))
        make_face()
        with BuildLine():
            Line((5.0382362679, 0), (6.9896180853, -2.7194188756))
            ThreePointArc((6.9896180853, -2.7194188756), (7.3713002801, -1.3834493775), (7.5, 0))
            ThreePointArc((7.5, 0), (5.5494325298, 5.0451757747), (0.7123203741, 7.4660966833))
            Line((0.7123203741, 7.4660966833), (-1.5841080516, 4.7424257169))
            ThreePointArc((-1.5841080516, 4.7424257169), (2.9222816207, 4.0571258458), (5, 0))
            ThreePointArc((5, 0), (4.9999342588, -0.0256399712), (4.9997370367, -0.0512792683))
            Line((4.9997370367, -0.0512792683), (5.0382362679, 0))
        make_face()
        with BuildLine():
            Line((1.4444038201, -4.7868254203), (4.9997370367, -0.0512792683))
            ThreePointArc((4.9997370367, -0.0512792683), (4.9999342588, -0.0256399712), (5, 0))
            ThreePointArc((5, 0), (2.9222816207, 4.0571258458), (-1.5841080516, 4.7424257169))
            Line((-1.5841080516, 4.7424257169), (-4.0267086588, 1.8453877419))
            Line((-4.0267086588, 1.8453877419), (-4.3330657581, 2.4949030315))
            ThreePointArc((-4.3330657581, 2.4949030315), (-3.9168845093, -3.1077348247), (1.4444038201, -4.7868254203))
        make_face()
        with BuildLine():
            ThreePointArc((-5.5405526463, 5.0549259514), (-6.9728435303, -2.7621464664), (-0.575954004, -7.4778524314))
            Line((-0.575954004, -7.4778524314), (1.4444038201, -4.7868254203))
            ThreePointArc((1.4444038201, -4.7868254203), (-3.9168845093, -3.1077348247), (-4.3330657581, 2.4949030315))
            Line((-4.3330657581, 2.4949030315), (-5.5405526463, 5.0549259514))
        make_face()
        with BuildLine():
            ThreePointArc((-6.670358772, 7.4502559589), (-9.7329978262, 2.2953765084), (-9.2963769315, -3.6847491023))
            Line((-9.2963769315, -3.6847491023), (-4.0858046945, -9.1272230168))
            ThreePointArc((-4.0858046945, -9.1272230168), (-3.1940488203, -9.476183416), (-2.2730034578, -9.7382470333))
            Line((-2.2730034578, -9.7382470333), (-0.575954004, -7.4778524314))
            ThreePointArc((-0.575954004, -7.4778524314), (-6.9728435303, -2.7621464664), (-5.5405526463, 5.0549259514))
            Line((-5.5405526463, 5.0549259514), (-6.670358772, 7.4502559589))
        make_face()
        with BuildLine():
            ThreePointArc((-7.7734498383, 9.7889467059), (-11.3301301239, 5.2799764559), (-12.4952800896, -0.3434755913))
            Line((-12.4952800896, -0.3434755913), (-9.2963769315, -3.6847491023))
            ThreePointArc((-9.2963769315, -3.6847491023), (-9.7329978262, 2.2953765084), (-6.670358772, 7.4502559589))
            Line((-6.670358772, 7.4502559589), (-7.7734498383, 9.7889467059))
        make_face()
        with BuildLine():
            ThreePointArc((-8.8639147293, 12.1008683851), (-12.8651308932, 7.7128728176), (-14.849995899, 2.1160391771))
            Line((-14.849995899, 2.1160391771), (-12.4952800896, -0.3434755913))
            ThreePointArc((-12.4952800896, -0.3434755913), (-11.3301301239, 5.2799764559), (-7.7734498383, 9.7889467059))
            Line((-7.7734498383, 9.7889467059), (-8.8639147293, 12.1008683851))
        make_face()
        with BuildLine():
            ThreePointArc((-9.9473635328, 14.3979150833), (-14.3660250029, 9.9933640791), (-16.9587523233, 4.3186478944))
            Line((-16.9587523233, 4.3186478944), (-14.849995899, 2.1160391771))
            ThreePointArc((-14.849995899, 2.1160391771), (-12.8651308932, 7.7128728176), (-8.8639147293, 12.1008683851))
            Line((-8.8639147293, 12.1008683851), (-9.9473635328, 14.3979150833))
        make_face()
        with BuildLine():
            ThreePointArc((-11.0264971881, 16.6858131285), (-15.8460260332, 12.2026004997), (-18.9491508236, 6.397631051))
            Line((-18.9491508236, 6.397631051), (-16.9587523233, 4.3186478944))
            ThreePointArc((-16.9587523233, 4.3186478944), (-14.3660250029, 9.9933640791), (-9.9473635328, 14.3979150833))
            Line((-9.9473635328, 14.3979150833), (-11.0264971881, 16.6858131285))
        make_face()
        with BuildLine():
            ThreePointArc((-12.1027830938, 18.9676735892), (-17.3121734711, 14.3714525956), (-20.8711196987, 8.4051390543))
            Line((-20.8711196987, 8.4051390543), (-18.9491508236, 6.397631051))
            ThreePointArc((-18.9491508236, 6.397631051), (-15.8460260332, 12.2026004997), (-11.0264971881, 16.6858131285))
            Line((-11.0264971881, 16.6858131285), (-12.1027830938, 18.9676735892))
        make_face()
        with BuildLine():
            ThreePointArc((-12.9623567896, 20.7900771153), (-18.4779593257, 16.0877288378), (-22.3763686864, 9.9773806388))
            Line((-22.3763686864, 9.9773806388), (-20.8711196987, 8.4051390543))
            ThreePointArc((-20.8711196987, 8.4051390543), (-17.3121734711, 14.3714525956), (-12.1027830938, 18.9676735892))
            Line((-12.1027830938, 18.9676735892), (-12.9623567896, 20.7900771153))
        make_face()
        with BuildLine():
            Line((-2.8126535472, -10.4570370167), (-2.2730034578, -9.7382470333))
            ThreePointArc((-2.2730034578, -9.7382470333), (-3.1940488203, -9.476183416), (-4.0858046945, -9.1272230168))
            Line((-4.0858046945, -9.1272230168), (-2.8126535472, -10.4570370167))
        make_face()
        with BuildLine():
            ThreePointArc((4.3102189136, 11.7333717625), (6.4782537194, 10.6902866541), (8.4062966321, 9.2511716519))
            Line((8.4062966321, 9.2511716519), (6.7470917355, 13.3968934127))
            ThreePointArc((6.7470917355, 13.3968934127), (6.3790622823, 13.5759922068), (6.0062833463, 13.744983098))
            Line((6.0062833463, 13.744983098), (4.3102189136, 11.7333717625))
        make_face()
        with BuildLine():
            ThreePointArc((6.0062833463, 13.744983098), (6.3790622823, 13.5759922068), (6.7470917355, 13.3968934127))
            Line((6.7470917355, 13.3968934127), (6.4141652547, 14.2287500203))
            Line((6.4141652547, 14.2287500203), (6.0062833463, 13.744983098))
        make_face()
    extrude(amount=F2_DEPTH)

    # F3
    f3_edges = [f1.edges().sort_by_distance(p)[0] for p in [
        (25, 25, 0.5),
        (25, -25, 0.5),
        (-25, -25, 0.5),
        (-25, 25, 0.5),
    ]]
    fillet(f3_edges, radius=F3_R)


solid = f1.part
